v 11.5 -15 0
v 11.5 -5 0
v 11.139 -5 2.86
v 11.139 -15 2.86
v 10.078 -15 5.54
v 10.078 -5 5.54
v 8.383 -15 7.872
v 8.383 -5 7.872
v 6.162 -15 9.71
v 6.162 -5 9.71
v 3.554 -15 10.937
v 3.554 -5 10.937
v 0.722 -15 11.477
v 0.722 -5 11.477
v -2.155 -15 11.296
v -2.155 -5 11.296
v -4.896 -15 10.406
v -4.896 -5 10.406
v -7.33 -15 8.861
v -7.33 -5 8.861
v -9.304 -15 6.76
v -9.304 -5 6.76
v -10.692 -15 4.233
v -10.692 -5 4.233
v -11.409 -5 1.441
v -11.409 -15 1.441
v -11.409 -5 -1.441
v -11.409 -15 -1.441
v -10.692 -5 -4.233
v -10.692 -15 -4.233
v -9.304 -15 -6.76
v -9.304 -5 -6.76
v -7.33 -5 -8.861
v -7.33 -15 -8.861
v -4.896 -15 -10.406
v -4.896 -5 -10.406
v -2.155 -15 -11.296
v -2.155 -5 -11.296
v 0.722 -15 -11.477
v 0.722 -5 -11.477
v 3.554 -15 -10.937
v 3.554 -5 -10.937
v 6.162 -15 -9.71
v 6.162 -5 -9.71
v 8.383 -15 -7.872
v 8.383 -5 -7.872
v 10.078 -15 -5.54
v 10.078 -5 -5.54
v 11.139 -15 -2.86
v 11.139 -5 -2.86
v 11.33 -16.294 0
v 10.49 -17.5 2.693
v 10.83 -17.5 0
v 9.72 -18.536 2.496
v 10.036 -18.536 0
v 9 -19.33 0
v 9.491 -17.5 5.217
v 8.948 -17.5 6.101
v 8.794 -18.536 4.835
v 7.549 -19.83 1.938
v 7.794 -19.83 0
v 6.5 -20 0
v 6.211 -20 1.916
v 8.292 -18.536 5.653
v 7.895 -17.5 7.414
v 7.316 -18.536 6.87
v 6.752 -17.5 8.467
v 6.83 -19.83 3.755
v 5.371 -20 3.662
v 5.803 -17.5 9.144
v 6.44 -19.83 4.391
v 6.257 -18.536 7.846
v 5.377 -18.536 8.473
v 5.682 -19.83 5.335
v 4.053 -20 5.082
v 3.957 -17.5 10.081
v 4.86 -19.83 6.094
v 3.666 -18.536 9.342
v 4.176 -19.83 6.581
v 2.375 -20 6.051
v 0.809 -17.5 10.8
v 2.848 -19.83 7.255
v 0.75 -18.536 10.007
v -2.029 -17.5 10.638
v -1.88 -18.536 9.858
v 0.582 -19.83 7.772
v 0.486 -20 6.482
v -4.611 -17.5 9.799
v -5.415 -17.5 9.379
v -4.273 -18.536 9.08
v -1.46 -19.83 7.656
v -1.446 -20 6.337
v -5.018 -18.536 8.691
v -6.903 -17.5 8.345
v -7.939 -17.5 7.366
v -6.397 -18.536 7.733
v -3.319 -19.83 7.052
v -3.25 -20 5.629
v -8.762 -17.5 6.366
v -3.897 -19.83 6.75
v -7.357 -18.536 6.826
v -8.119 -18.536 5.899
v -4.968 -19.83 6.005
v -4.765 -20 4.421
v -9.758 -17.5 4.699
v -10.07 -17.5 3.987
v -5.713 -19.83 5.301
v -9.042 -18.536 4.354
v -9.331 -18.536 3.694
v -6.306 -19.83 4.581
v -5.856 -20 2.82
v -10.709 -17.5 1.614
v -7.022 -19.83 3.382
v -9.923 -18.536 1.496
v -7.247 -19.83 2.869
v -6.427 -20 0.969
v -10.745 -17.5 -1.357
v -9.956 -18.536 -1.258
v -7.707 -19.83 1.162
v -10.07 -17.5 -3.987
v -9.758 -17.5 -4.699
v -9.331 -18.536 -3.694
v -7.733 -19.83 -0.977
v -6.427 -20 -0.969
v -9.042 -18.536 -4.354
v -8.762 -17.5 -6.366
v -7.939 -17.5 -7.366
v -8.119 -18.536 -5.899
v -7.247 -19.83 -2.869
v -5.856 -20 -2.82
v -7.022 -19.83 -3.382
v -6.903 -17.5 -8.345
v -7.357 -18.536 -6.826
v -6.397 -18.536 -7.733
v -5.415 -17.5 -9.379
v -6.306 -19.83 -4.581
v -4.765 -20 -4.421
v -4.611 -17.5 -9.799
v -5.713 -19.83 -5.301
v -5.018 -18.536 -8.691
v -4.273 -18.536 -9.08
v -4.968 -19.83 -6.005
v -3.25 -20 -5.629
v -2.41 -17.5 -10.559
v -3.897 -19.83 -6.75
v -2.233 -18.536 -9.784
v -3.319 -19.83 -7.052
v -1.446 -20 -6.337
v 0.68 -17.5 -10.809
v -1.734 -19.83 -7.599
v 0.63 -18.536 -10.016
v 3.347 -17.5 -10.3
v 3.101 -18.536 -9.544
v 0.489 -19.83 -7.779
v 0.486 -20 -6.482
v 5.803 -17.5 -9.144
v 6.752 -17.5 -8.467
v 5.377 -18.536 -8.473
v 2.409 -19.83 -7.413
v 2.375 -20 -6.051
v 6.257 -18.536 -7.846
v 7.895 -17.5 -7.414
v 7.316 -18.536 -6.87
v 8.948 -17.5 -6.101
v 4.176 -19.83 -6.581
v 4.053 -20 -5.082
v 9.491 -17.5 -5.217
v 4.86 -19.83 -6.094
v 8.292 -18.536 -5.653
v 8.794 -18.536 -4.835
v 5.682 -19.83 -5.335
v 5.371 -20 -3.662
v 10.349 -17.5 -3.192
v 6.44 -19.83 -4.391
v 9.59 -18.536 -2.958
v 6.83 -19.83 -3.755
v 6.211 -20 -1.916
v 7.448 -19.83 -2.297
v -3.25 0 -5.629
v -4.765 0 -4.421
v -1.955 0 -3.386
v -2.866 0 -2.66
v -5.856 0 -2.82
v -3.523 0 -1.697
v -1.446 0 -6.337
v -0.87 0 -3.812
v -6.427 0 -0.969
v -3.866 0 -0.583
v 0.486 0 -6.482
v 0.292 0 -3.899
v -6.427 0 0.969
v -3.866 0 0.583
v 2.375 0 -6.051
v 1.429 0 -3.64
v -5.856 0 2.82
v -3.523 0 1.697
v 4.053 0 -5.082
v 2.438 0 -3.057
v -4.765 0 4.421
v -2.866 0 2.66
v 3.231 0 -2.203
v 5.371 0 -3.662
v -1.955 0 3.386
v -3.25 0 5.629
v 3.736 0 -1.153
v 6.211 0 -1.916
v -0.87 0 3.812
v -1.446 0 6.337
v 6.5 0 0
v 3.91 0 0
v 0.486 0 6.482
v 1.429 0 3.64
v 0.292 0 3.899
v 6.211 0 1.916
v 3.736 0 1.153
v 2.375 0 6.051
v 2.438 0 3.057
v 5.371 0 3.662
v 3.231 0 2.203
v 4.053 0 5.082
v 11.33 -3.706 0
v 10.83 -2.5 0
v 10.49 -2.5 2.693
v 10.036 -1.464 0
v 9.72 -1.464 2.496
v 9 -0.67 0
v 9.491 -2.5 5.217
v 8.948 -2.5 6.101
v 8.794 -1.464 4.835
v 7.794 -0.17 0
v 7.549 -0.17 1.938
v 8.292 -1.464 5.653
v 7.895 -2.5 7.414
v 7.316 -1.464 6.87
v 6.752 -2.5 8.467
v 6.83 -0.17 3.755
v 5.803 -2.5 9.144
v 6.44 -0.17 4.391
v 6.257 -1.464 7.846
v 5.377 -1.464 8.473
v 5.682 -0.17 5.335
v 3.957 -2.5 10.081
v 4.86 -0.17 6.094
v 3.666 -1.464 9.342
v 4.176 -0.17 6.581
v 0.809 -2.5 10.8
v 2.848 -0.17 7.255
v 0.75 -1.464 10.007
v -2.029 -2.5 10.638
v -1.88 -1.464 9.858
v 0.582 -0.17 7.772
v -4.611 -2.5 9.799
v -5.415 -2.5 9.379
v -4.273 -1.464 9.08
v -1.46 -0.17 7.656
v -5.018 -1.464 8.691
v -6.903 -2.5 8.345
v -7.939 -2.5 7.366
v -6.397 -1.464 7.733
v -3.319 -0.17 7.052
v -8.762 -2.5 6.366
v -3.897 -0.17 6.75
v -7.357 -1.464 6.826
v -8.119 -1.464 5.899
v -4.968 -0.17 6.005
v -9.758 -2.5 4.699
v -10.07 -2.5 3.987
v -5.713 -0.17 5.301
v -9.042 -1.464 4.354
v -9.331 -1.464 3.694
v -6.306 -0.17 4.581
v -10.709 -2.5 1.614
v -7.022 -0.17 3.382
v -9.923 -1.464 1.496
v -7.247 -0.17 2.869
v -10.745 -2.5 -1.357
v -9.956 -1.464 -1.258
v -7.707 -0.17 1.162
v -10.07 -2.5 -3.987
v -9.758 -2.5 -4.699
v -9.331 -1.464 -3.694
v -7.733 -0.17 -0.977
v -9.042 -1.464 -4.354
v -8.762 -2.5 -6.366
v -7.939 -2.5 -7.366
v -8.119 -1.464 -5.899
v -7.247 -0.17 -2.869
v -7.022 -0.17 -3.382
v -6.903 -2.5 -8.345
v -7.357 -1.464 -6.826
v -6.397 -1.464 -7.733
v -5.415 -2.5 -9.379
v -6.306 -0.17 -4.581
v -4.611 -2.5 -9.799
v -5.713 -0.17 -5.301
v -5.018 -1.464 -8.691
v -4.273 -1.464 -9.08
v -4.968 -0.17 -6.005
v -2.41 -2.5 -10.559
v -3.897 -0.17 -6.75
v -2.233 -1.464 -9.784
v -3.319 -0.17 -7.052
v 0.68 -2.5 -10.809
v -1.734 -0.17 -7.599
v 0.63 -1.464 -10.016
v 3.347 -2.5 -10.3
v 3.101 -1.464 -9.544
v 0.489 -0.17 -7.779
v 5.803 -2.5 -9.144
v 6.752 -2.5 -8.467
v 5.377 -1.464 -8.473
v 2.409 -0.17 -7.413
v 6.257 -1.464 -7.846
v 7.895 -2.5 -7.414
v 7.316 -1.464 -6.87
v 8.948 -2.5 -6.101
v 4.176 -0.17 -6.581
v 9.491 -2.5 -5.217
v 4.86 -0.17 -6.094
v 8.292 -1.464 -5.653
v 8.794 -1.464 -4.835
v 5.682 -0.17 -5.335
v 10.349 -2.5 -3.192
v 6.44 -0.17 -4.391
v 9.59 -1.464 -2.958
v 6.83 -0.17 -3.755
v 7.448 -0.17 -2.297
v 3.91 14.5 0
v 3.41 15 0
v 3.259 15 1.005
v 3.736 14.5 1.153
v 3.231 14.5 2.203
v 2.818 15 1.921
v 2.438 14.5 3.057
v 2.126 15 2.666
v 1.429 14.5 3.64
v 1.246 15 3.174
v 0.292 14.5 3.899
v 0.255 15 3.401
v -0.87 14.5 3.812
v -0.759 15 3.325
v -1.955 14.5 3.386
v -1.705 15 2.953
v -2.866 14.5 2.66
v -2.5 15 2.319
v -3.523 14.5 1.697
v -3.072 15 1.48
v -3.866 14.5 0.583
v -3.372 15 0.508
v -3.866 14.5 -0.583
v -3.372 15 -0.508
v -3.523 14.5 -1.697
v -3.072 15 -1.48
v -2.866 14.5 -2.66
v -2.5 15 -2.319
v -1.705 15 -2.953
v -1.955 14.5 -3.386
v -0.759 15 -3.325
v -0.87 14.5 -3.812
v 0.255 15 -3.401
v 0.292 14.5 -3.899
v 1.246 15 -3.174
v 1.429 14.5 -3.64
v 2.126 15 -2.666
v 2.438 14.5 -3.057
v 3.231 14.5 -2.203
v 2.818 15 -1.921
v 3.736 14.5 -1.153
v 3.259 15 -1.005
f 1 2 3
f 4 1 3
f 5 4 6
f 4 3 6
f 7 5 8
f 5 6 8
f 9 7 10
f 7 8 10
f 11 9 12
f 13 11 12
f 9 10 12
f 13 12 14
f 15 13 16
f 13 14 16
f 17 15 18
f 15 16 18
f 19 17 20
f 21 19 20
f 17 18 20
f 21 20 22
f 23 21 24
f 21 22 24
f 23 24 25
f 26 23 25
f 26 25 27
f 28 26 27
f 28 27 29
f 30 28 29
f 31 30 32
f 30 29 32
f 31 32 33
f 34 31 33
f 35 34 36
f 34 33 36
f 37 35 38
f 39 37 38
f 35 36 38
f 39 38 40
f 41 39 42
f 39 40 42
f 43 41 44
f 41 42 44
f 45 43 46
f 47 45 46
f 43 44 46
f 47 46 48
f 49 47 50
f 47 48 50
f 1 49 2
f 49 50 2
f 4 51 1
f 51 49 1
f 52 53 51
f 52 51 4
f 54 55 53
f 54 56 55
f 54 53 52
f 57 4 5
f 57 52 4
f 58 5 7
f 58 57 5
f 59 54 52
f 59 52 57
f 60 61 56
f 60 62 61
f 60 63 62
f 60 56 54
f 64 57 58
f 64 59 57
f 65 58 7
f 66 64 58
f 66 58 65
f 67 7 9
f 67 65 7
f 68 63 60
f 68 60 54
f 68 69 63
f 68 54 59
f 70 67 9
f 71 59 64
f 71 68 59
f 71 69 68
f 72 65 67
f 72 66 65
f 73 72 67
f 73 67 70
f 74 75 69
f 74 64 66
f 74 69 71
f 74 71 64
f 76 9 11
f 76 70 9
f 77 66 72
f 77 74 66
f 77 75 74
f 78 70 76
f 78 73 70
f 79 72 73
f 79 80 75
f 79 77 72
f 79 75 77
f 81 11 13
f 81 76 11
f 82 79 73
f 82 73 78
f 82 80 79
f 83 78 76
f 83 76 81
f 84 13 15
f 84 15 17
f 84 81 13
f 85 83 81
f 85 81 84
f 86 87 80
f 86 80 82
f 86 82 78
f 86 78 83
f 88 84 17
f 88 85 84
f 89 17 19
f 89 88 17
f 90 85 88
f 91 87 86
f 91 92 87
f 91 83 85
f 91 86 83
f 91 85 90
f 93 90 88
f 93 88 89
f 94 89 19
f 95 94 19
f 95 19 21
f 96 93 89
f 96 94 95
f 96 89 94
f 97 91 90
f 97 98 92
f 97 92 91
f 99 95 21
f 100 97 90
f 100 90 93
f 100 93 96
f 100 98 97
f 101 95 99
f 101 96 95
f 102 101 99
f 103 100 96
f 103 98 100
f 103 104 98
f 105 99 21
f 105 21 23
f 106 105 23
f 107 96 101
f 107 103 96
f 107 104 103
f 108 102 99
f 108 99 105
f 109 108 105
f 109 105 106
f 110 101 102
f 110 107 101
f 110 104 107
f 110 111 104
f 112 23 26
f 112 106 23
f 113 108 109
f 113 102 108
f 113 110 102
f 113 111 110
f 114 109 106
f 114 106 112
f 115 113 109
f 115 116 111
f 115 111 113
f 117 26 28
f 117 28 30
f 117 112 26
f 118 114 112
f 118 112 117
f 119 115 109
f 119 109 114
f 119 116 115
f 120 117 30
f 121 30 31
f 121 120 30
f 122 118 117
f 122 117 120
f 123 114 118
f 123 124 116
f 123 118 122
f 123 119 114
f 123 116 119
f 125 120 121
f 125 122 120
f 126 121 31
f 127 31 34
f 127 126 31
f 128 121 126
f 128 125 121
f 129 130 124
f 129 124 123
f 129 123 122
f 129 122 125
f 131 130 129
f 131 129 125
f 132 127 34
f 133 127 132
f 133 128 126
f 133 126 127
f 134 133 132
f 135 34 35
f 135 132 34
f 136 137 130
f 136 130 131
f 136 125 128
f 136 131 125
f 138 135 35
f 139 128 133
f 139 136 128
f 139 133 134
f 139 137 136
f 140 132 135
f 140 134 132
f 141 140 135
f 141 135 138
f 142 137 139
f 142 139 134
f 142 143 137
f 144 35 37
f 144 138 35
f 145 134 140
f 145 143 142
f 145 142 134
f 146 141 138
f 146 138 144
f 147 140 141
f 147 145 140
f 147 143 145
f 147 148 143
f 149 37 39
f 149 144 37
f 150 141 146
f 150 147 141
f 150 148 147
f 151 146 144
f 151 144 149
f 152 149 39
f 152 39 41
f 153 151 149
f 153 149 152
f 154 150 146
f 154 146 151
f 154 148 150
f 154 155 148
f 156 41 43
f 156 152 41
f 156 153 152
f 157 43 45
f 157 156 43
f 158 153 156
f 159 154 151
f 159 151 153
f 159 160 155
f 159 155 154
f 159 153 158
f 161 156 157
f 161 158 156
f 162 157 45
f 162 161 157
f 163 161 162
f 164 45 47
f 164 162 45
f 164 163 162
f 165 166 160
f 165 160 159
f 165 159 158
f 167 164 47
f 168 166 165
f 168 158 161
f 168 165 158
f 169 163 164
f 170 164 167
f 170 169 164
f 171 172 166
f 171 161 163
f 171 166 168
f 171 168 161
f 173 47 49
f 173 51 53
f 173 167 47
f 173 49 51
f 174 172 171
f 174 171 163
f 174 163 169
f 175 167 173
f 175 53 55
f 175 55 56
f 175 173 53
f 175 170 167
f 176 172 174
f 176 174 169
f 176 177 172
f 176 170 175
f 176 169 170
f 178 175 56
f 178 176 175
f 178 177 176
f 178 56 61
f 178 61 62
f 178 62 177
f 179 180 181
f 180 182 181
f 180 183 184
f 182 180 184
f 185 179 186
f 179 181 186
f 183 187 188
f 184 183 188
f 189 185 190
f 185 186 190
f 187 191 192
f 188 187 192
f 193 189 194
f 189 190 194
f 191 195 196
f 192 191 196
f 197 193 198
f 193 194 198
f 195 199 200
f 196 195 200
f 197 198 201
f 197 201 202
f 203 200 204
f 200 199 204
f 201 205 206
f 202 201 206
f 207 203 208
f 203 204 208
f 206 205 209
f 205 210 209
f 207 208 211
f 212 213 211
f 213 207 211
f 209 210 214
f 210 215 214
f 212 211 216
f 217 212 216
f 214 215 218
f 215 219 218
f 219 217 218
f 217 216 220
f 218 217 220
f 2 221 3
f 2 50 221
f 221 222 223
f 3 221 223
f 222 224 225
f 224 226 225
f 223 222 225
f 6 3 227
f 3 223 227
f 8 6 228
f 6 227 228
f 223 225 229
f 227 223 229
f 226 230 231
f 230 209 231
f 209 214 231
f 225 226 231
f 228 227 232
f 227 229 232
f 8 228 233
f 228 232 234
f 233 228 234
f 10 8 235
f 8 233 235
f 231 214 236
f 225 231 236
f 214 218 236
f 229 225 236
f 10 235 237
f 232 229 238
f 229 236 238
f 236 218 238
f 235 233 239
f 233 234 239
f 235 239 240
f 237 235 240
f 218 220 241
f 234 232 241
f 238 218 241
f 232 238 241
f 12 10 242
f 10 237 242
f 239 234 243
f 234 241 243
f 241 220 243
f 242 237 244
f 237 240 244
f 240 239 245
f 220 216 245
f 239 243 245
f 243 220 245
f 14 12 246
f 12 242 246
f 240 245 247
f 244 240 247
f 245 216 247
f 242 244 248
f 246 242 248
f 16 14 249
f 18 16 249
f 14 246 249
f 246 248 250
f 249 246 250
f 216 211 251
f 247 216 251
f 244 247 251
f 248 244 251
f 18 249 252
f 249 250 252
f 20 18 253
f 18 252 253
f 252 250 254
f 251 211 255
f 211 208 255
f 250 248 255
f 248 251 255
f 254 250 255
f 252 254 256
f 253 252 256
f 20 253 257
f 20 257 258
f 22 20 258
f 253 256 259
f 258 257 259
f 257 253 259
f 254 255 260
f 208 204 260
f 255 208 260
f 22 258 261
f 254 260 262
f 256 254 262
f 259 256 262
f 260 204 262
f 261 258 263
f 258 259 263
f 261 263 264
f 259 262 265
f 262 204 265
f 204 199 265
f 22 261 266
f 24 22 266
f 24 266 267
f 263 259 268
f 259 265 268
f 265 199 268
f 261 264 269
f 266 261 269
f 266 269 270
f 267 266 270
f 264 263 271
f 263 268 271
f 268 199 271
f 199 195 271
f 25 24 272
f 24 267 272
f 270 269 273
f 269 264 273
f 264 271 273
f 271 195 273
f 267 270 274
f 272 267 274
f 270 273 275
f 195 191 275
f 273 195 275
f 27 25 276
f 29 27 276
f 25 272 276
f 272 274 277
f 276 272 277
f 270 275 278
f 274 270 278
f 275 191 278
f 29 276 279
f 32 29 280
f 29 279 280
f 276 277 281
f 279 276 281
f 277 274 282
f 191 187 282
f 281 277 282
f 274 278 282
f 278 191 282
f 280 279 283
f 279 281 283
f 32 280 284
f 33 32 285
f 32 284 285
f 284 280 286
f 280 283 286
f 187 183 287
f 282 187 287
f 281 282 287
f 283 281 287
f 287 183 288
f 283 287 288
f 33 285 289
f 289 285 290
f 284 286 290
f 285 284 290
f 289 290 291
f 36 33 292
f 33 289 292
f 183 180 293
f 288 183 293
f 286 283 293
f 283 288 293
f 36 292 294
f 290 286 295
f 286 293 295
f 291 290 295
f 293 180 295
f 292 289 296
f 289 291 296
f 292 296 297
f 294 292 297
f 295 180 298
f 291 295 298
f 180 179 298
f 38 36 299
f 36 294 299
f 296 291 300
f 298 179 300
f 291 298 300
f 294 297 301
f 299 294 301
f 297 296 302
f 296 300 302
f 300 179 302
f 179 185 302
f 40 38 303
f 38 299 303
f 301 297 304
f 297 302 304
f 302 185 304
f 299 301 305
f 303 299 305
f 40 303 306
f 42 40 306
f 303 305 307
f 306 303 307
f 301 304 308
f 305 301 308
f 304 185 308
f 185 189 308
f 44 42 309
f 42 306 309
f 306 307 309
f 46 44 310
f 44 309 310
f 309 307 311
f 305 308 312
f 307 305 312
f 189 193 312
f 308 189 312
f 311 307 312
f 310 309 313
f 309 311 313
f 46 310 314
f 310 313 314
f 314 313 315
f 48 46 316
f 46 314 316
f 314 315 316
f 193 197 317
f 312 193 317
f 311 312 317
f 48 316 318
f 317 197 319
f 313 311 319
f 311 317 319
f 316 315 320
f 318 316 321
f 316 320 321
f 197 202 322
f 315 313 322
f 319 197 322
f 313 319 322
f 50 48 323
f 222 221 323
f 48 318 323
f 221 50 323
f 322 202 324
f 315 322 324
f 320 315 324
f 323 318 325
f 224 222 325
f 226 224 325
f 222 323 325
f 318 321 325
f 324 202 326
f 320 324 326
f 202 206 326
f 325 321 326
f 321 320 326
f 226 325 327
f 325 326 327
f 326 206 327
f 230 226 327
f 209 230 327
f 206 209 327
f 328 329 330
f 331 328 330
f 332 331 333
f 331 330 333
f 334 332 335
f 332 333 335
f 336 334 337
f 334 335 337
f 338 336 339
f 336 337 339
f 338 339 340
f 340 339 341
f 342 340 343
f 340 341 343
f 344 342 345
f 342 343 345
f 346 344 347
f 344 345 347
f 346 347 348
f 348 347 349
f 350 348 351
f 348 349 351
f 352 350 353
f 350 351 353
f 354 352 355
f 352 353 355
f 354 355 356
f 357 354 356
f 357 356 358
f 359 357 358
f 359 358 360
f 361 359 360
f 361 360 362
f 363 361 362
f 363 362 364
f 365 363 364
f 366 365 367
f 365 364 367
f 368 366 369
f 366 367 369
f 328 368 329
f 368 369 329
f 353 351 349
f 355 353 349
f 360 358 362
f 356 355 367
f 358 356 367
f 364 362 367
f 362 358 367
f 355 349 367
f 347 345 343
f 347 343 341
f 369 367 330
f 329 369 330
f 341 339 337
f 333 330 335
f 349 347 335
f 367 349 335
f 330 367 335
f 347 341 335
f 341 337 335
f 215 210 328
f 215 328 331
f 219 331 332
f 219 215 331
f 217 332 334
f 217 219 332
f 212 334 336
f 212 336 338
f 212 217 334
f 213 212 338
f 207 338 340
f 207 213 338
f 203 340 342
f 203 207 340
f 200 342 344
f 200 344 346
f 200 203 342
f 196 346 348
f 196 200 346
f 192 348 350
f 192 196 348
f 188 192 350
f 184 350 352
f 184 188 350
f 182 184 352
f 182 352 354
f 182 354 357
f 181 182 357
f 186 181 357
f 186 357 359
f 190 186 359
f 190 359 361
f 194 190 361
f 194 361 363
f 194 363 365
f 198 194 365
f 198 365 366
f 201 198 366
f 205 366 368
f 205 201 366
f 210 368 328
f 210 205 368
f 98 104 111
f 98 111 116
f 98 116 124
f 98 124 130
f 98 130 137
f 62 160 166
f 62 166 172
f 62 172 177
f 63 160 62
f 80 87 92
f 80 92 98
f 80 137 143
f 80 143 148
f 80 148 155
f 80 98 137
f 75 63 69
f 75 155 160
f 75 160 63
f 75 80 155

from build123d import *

# Parameters (mm, degrees)
F0_R     = 11.5
F1_DEPTH = 20
F2_R     = 5
F3_R     = 3.910161
F4_DEPTH = 15
F5_SIZE  = 0.5


with BuildPart() as f1:
    # F0 (on Front) → F1 (new body)
    with BuildSketch(Plane.XZ):
        Circle(F0_R)
    extrude(amount=F1_DEPTH)

    # F2
    f2_edges = [f1.edges().sort_by_distance(p)[0] for p in [
        (-11.5, -20, 0),
        (-11.5, 0, 0),
    ]]
    fillet(f2_edges, radius=F2_R)

    # F3 (on Front) → F4 (join)
    with BuildSketch(Plane.XZ):
        Circle(F3_R)
    extrude(amount=-F4_DEPTH)

    # F5
    f5_edges = [f1.edges().sort_by_distance(p)[0] for p in [
        (-3.910161, 15, 0),
    ]]
    chamfer(f5_edges, length=F5_SIZE)


solid = f1.part
